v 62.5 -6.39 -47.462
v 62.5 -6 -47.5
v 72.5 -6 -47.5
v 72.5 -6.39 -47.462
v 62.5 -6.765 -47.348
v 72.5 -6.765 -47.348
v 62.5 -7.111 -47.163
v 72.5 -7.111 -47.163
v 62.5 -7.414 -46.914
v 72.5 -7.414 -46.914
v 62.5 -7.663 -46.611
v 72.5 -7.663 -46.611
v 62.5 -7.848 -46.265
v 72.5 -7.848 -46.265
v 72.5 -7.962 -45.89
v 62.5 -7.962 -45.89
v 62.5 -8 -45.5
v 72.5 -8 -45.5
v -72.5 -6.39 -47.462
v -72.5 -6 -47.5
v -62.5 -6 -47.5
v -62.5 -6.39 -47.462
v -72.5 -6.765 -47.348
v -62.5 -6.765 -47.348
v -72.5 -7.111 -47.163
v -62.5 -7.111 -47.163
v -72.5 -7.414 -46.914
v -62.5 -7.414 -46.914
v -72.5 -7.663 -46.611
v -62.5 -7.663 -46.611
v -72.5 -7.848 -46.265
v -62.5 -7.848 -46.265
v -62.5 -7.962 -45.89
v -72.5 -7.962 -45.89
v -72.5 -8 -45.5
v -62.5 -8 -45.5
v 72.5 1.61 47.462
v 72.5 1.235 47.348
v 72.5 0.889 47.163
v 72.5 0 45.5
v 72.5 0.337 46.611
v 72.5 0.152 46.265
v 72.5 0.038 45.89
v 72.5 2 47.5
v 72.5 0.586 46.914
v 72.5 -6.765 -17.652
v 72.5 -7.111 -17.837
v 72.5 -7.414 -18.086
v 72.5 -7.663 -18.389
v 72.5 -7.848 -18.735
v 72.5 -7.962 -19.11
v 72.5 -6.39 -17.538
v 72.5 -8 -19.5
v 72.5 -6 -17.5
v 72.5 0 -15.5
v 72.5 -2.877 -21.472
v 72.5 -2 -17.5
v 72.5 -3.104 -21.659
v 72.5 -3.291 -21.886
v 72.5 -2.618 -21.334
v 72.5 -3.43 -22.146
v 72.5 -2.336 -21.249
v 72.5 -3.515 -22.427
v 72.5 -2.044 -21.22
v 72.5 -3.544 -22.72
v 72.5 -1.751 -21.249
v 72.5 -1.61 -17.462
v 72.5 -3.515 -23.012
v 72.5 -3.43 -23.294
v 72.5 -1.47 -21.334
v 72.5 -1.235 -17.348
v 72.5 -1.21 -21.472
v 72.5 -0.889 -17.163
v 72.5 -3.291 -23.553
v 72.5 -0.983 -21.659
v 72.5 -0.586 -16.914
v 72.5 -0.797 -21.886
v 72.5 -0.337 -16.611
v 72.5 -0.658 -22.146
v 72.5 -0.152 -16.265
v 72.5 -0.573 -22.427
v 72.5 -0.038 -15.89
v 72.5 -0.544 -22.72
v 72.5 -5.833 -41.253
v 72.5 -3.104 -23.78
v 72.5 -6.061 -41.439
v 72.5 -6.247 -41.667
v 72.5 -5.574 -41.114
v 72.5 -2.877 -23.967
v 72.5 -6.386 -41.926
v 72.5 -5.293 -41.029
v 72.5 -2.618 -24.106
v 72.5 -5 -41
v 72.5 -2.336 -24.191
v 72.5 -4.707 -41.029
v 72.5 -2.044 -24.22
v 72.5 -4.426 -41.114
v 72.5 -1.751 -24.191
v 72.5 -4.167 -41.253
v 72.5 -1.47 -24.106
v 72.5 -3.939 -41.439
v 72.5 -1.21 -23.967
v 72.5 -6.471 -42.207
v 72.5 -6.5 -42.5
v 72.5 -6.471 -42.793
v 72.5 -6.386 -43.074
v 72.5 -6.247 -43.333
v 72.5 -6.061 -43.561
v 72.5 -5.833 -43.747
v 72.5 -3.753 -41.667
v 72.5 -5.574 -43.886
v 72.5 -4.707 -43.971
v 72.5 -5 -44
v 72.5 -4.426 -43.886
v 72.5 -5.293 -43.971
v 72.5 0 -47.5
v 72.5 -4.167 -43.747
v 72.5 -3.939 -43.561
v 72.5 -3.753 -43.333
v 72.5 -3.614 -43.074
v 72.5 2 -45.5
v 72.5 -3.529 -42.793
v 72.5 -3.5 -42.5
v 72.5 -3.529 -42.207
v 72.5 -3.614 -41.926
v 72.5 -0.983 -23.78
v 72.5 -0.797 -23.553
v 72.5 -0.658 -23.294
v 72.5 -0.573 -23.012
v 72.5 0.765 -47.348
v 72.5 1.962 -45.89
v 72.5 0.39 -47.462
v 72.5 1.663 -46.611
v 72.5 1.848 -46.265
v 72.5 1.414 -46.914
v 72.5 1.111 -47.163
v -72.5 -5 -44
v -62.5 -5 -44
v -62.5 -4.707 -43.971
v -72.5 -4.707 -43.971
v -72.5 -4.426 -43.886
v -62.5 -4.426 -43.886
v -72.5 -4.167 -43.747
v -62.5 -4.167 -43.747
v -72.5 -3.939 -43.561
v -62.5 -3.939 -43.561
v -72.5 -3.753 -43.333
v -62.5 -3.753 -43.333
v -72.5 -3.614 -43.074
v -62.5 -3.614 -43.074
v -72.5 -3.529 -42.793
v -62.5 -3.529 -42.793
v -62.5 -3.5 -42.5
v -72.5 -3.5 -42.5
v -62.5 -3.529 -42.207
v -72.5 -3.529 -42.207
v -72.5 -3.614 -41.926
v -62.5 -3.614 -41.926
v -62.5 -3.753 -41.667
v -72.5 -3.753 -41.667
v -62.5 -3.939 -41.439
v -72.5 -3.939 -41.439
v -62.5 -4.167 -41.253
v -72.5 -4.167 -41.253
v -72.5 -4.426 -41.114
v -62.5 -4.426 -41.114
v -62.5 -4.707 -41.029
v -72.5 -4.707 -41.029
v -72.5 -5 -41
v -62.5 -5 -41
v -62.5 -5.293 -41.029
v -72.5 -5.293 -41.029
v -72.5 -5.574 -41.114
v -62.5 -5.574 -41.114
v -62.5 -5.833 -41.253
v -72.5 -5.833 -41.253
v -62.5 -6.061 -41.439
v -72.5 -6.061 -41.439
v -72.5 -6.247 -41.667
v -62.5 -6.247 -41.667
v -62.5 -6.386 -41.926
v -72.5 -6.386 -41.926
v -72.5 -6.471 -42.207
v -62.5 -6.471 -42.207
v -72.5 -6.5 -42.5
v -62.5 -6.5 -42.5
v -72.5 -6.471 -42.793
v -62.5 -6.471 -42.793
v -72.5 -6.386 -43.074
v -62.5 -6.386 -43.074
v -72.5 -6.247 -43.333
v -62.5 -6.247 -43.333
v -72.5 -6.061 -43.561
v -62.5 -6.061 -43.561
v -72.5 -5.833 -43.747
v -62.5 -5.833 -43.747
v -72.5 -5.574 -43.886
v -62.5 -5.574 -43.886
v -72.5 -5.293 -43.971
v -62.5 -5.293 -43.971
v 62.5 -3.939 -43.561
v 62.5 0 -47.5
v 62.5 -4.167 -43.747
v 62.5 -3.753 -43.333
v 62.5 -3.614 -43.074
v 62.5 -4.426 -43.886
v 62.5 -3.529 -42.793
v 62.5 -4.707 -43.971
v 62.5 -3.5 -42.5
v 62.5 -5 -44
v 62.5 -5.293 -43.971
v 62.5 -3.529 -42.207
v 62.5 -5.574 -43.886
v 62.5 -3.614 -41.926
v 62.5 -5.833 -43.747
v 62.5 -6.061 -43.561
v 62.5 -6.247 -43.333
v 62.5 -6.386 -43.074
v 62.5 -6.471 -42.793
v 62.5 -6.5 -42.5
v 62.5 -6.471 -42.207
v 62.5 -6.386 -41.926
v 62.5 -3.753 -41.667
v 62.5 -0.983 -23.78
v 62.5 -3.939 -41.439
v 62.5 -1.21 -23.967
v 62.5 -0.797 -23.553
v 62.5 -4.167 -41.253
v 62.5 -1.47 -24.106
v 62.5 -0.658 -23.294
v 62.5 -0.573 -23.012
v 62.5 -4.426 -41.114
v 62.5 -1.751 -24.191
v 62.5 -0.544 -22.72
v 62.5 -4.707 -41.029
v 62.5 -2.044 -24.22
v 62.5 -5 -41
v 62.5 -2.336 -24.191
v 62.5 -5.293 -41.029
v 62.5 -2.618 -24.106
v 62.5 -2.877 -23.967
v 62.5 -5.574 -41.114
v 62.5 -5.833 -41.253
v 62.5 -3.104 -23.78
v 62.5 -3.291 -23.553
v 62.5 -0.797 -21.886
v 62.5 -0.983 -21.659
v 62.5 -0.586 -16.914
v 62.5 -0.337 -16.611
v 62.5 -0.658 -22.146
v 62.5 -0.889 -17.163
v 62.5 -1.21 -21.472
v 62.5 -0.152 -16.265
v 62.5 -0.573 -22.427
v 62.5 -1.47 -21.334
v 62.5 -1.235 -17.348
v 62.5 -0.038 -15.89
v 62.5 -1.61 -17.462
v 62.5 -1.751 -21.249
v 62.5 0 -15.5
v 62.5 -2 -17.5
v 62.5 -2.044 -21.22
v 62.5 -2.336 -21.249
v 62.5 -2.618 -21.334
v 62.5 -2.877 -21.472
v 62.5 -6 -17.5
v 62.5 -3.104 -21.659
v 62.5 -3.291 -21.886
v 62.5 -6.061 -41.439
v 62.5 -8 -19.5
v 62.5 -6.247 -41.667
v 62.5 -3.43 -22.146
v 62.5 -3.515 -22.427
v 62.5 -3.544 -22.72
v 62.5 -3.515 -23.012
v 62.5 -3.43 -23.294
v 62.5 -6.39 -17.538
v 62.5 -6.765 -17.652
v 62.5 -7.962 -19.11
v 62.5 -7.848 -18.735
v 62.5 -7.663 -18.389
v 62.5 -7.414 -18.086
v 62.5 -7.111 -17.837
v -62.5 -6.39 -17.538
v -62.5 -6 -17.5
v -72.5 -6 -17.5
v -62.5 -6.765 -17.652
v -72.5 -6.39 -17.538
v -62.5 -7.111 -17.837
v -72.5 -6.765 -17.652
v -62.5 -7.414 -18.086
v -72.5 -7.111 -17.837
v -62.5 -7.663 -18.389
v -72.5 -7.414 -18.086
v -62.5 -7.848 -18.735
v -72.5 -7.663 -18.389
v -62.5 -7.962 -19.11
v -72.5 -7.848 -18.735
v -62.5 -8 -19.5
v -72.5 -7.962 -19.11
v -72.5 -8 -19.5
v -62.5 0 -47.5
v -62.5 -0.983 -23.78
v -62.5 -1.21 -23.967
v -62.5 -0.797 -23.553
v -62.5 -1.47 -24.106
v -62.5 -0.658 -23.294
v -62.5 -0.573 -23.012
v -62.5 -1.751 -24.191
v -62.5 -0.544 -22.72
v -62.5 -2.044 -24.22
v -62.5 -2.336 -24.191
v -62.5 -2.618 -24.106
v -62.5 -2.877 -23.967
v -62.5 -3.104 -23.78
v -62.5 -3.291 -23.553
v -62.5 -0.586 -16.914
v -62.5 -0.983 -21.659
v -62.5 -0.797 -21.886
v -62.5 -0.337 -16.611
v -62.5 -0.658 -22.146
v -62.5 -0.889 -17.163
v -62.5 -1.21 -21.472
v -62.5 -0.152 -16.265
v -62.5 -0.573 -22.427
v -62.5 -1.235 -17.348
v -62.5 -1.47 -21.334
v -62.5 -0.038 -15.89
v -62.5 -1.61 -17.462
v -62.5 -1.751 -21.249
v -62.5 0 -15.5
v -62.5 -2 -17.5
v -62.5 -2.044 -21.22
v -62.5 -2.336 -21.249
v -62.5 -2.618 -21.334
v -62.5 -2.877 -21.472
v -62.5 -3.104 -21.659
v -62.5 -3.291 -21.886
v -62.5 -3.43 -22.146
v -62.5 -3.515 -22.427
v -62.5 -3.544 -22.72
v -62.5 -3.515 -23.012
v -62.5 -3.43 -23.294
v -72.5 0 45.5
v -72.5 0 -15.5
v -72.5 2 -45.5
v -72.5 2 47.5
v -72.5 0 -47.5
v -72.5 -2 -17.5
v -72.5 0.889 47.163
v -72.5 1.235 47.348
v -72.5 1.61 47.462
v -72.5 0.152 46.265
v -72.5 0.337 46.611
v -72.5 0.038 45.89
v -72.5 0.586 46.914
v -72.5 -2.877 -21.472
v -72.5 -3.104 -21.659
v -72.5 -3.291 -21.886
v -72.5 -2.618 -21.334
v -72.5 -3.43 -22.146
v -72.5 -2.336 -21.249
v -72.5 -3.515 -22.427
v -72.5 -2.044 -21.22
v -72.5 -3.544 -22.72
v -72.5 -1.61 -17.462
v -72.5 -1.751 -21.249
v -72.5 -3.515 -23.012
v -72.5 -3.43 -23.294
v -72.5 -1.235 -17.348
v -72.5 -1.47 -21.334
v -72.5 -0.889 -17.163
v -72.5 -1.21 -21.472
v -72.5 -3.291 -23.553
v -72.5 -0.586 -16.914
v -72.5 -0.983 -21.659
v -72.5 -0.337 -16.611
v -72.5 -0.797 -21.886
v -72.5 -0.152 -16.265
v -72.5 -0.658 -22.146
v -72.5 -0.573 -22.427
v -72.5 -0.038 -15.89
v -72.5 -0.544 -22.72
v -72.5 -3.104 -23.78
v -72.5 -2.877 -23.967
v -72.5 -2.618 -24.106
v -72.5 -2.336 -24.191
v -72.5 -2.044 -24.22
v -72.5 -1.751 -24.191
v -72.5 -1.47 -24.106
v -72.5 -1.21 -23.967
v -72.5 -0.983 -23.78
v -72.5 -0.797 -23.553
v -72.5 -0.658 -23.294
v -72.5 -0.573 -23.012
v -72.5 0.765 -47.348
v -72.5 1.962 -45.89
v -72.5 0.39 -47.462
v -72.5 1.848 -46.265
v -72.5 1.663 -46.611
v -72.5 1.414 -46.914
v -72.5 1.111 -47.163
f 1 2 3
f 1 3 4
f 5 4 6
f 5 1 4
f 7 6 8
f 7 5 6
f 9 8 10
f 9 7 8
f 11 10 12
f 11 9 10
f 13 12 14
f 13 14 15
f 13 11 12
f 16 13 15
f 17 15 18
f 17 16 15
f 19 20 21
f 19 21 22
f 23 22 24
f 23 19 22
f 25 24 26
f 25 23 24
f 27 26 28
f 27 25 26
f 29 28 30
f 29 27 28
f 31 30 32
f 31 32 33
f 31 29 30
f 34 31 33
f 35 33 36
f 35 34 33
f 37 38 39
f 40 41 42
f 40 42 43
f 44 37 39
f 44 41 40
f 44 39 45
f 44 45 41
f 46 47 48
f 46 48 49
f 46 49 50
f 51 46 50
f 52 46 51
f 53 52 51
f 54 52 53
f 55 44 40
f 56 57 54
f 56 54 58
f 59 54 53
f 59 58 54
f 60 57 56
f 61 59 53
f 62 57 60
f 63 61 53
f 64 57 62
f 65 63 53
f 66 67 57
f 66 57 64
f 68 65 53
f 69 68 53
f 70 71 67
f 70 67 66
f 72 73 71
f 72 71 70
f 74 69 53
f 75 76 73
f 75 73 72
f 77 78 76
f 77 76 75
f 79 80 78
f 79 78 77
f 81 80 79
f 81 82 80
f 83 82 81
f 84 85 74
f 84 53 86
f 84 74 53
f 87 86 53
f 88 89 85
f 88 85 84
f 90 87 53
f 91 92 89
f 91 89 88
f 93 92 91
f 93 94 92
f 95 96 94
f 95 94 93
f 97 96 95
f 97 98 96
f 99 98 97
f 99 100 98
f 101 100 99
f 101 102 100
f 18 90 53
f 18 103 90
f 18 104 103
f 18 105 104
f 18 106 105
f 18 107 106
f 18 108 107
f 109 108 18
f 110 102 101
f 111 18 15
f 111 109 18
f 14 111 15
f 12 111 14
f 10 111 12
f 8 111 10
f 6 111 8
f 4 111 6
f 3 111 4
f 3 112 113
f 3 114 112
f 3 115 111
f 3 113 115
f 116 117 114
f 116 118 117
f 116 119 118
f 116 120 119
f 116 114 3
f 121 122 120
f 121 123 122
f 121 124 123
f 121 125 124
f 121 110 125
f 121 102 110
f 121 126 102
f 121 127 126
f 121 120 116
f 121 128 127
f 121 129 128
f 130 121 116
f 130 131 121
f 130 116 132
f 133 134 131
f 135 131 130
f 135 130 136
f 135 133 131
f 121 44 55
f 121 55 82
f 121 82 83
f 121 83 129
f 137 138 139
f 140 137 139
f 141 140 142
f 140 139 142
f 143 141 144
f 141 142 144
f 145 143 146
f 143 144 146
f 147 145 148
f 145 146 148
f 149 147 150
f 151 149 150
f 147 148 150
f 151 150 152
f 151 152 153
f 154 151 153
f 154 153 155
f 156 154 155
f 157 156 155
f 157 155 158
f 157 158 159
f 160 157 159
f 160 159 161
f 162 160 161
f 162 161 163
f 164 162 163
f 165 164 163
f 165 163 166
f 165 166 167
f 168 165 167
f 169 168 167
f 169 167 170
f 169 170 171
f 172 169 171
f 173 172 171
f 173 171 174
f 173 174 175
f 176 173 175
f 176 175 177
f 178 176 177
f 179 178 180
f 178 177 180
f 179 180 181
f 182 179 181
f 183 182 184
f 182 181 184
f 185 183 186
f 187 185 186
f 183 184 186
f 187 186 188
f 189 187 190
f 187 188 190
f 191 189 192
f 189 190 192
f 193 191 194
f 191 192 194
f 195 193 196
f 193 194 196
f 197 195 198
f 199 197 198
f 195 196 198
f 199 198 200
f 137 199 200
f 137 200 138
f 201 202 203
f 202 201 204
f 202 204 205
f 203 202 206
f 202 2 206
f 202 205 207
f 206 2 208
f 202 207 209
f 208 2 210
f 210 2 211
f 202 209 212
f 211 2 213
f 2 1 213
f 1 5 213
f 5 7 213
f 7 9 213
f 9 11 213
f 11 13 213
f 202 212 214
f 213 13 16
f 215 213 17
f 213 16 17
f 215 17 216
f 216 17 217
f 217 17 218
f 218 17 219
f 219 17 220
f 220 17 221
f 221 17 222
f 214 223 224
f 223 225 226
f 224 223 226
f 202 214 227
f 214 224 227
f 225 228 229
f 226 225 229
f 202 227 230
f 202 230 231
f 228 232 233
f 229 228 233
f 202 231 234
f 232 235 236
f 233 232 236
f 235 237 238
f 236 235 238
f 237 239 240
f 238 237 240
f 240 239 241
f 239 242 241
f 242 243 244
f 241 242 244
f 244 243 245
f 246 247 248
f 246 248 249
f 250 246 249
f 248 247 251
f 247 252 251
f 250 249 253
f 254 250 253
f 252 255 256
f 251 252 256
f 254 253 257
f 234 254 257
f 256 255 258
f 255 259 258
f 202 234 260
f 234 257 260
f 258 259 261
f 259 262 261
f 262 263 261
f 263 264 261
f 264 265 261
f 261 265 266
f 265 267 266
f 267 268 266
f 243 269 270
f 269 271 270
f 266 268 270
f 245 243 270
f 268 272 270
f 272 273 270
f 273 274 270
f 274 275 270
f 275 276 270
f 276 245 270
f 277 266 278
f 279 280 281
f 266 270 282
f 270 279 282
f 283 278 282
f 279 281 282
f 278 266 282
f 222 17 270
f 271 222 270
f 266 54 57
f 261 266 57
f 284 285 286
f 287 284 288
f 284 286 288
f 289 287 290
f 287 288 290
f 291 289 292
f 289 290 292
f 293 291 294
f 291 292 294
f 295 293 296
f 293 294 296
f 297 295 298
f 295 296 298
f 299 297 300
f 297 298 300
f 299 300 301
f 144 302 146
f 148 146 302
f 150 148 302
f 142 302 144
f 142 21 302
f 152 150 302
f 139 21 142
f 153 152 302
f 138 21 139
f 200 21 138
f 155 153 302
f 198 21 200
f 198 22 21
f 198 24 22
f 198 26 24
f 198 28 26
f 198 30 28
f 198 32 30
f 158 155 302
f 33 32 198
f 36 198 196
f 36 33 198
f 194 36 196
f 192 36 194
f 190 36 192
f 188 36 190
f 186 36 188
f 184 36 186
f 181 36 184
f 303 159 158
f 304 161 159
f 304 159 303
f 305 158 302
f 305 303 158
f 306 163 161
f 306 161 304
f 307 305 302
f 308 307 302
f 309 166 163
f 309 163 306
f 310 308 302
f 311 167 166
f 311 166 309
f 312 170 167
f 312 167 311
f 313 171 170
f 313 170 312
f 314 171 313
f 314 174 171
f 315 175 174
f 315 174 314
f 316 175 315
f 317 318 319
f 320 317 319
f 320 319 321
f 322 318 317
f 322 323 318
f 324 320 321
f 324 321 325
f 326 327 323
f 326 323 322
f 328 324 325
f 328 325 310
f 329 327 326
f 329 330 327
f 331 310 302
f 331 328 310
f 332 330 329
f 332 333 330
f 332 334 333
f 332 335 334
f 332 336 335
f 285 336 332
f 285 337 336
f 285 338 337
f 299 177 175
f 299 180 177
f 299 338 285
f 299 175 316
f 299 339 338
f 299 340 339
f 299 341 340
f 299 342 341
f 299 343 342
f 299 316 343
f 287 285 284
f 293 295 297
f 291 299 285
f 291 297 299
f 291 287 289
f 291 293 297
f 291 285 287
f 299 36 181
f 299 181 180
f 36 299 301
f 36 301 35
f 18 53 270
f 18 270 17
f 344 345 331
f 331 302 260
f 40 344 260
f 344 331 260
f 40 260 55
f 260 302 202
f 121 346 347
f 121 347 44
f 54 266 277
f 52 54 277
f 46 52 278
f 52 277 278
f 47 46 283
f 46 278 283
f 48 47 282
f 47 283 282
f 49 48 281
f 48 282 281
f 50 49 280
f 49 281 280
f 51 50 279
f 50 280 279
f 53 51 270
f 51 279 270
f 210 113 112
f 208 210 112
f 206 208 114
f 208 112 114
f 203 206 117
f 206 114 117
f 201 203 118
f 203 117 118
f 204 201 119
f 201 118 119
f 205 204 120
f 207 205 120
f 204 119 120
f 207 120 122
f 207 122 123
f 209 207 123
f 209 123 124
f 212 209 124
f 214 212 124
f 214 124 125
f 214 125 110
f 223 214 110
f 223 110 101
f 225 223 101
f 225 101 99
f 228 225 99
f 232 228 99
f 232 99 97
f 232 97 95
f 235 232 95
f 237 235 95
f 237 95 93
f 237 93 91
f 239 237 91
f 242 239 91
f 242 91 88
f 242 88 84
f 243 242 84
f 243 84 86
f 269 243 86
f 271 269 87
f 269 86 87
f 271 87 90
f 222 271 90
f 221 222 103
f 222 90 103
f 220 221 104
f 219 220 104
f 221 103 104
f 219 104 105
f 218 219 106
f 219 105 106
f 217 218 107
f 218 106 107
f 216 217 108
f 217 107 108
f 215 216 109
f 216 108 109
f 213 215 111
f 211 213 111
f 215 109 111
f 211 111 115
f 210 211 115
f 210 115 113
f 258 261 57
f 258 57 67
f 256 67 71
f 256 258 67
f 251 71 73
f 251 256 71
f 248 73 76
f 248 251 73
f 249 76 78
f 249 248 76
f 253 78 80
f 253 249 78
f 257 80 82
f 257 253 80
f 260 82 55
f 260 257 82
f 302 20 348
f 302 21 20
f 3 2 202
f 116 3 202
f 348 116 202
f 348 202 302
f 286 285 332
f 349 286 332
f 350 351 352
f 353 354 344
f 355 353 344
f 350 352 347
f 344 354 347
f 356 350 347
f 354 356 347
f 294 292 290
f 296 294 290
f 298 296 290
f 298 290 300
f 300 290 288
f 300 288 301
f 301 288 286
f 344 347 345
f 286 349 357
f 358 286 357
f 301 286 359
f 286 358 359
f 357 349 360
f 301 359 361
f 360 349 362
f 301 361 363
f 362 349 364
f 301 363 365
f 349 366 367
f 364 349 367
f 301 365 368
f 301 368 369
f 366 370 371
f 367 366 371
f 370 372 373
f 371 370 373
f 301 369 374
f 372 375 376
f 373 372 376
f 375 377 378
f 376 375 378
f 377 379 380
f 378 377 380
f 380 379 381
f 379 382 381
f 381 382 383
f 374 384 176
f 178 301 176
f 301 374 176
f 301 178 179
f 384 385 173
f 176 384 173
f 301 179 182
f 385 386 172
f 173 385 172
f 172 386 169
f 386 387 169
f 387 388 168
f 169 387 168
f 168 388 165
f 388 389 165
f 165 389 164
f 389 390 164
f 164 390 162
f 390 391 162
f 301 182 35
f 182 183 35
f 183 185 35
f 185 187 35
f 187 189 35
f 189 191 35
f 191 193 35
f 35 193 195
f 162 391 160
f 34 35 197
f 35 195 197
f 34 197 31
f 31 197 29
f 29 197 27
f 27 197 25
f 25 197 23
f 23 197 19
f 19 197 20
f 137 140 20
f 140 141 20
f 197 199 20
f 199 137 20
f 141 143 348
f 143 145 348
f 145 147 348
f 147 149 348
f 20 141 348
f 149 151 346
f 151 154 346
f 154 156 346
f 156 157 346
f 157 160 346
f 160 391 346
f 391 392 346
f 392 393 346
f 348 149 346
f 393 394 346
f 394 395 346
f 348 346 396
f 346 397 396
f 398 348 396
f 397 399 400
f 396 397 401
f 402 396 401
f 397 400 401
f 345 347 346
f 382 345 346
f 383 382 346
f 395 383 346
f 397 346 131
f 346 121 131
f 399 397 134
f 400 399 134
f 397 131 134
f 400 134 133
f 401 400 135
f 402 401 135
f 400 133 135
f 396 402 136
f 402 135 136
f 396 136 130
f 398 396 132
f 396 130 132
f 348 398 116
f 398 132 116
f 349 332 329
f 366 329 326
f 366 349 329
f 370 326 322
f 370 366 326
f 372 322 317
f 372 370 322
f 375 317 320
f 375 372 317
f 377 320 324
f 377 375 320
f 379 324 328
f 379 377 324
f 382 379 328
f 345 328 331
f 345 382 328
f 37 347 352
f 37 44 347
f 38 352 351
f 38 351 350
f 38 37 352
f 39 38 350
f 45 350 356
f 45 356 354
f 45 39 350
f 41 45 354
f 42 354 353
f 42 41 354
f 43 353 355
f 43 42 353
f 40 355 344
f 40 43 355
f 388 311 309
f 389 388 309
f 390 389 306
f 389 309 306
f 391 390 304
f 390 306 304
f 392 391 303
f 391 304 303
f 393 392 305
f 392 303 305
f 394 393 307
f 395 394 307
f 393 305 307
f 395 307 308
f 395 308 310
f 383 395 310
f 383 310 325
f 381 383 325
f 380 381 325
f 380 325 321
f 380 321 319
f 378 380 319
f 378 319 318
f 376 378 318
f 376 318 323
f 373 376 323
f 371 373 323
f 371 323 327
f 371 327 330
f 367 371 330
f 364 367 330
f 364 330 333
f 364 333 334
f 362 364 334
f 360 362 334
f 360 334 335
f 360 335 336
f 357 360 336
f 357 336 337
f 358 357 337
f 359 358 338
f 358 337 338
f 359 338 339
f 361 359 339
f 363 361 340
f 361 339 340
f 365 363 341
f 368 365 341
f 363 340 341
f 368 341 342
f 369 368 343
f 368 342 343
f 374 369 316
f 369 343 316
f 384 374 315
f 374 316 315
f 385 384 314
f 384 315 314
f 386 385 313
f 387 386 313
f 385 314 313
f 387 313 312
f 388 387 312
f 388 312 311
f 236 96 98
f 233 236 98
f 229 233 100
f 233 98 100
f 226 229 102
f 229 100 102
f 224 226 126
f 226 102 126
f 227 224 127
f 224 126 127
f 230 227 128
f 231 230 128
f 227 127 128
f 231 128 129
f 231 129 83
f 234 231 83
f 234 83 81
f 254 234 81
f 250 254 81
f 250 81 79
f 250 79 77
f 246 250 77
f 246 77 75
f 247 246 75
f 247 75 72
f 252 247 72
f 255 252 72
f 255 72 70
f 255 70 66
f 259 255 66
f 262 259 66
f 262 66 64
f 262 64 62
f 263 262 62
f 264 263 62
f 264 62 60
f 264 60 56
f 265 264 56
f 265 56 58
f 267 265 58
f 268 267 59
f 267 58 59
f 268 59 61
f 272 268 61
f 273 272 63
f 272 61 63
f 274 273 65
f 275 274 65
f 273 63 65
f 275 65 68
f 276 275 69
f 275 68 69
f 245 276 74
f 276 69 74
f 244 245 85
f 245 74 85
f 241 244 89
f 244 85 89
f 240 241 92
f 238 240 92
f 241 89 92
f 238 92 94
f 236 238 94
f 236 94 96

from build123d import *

# Parameters (mm, degrees)
SKETCH_1_W          = 145
SKETCH_1_H          = 95
EXTRUDE_1_DEPTH     = 2
SKETCH_2_W          = 30
SKETCH_2_H          = 8
SKETCH_2_R          = 1.5
EXTRUDE_2_DEPTH     = 145
FILLET_1_R          = 2
CUT_EXTRUDE_2_REACH = 89.25
SKETCH_3_W          = 125
SKETCH_3_H          = 147.268730198


with BuildPart() as part:
    # 草图1 → 凸台-拉伸1 (new body)
    with BuildSketch(Plane(origin=(0, 0, 0), x_dir=(1, 0, 0), z_dir=(0, 1, 0))):
        Rectangle(SKETCH_1_W, SKETCH_1_H)
    extrude(amount=EXTRUDE_1_DEPTH)

    # 草图2 → 凸台-拉伸2 (add, through all)
    with BuildSketch(Plane(origin=(72.5, 0, 0), x_dir=(0, 0, -1), z_dir=(1, 0, 0))):
        with Locations((32.5, -4)):
            Rectangle(SKETCH_2_W, SKETCH_2_H)
        with Locations((22.719682733, -2.043811777)):
            Circle(SKETCH_2_R, mode=Mode.SUBTRACT)
        with Locations((42.5, -5)):
            Circle(SKETCH_2_R, mode=Mode.SUBTRACT)
    extrude(amount=-EXTRUDE_2_DEPTH)

    # 圆角1
    fillet_1_edges = [part.edges().sort_by_distance(p)[0] for p in [
        (0, 2, -47.5),
        (0, -8, -47.5),
        (0, -8, -17.5),
        (0, 0, -17.5),
        (0, 0, 47.5),
    ]]
    fillet(fillet_1_edges, radius=FILLET_1_R - 0.0001)  # a hair under: the kernel refuses the full size

    # 切除-拉伸2: up to this face of the body (flat: up to its plane)
    cut_extrude_2_end = Plane(part.part.faces().sort_by_distance((0, 0, 15))[0])
    # 草图3 → 切除-拉伸2 (cut, up to the picked face)
    with BuildSketch(Plane.XZ.offset(8), mode=Mode.PRIVATE) as cut_extrude_2_sk1:
        Rectangle(SKETCH_3_W, SKETCH_3_H)
    cut_extrude_2_tool1 = split(extrude(cut_extrude_2_sk1.sketch, amount=-CUT_EXTRUDE_2_REACH, mode=Mode.PRIVATE), bisect_by=cut_extrude_2_end, keep=Keep.BOTH, mode=Mode.PRIVATE)
    add(cut_extrude_2_tool1.solids().sort_by(Axis((0, -8, 0), (0, 1, 0)))[0], mode=Mode.SUBTRACT)


solid = part.part
